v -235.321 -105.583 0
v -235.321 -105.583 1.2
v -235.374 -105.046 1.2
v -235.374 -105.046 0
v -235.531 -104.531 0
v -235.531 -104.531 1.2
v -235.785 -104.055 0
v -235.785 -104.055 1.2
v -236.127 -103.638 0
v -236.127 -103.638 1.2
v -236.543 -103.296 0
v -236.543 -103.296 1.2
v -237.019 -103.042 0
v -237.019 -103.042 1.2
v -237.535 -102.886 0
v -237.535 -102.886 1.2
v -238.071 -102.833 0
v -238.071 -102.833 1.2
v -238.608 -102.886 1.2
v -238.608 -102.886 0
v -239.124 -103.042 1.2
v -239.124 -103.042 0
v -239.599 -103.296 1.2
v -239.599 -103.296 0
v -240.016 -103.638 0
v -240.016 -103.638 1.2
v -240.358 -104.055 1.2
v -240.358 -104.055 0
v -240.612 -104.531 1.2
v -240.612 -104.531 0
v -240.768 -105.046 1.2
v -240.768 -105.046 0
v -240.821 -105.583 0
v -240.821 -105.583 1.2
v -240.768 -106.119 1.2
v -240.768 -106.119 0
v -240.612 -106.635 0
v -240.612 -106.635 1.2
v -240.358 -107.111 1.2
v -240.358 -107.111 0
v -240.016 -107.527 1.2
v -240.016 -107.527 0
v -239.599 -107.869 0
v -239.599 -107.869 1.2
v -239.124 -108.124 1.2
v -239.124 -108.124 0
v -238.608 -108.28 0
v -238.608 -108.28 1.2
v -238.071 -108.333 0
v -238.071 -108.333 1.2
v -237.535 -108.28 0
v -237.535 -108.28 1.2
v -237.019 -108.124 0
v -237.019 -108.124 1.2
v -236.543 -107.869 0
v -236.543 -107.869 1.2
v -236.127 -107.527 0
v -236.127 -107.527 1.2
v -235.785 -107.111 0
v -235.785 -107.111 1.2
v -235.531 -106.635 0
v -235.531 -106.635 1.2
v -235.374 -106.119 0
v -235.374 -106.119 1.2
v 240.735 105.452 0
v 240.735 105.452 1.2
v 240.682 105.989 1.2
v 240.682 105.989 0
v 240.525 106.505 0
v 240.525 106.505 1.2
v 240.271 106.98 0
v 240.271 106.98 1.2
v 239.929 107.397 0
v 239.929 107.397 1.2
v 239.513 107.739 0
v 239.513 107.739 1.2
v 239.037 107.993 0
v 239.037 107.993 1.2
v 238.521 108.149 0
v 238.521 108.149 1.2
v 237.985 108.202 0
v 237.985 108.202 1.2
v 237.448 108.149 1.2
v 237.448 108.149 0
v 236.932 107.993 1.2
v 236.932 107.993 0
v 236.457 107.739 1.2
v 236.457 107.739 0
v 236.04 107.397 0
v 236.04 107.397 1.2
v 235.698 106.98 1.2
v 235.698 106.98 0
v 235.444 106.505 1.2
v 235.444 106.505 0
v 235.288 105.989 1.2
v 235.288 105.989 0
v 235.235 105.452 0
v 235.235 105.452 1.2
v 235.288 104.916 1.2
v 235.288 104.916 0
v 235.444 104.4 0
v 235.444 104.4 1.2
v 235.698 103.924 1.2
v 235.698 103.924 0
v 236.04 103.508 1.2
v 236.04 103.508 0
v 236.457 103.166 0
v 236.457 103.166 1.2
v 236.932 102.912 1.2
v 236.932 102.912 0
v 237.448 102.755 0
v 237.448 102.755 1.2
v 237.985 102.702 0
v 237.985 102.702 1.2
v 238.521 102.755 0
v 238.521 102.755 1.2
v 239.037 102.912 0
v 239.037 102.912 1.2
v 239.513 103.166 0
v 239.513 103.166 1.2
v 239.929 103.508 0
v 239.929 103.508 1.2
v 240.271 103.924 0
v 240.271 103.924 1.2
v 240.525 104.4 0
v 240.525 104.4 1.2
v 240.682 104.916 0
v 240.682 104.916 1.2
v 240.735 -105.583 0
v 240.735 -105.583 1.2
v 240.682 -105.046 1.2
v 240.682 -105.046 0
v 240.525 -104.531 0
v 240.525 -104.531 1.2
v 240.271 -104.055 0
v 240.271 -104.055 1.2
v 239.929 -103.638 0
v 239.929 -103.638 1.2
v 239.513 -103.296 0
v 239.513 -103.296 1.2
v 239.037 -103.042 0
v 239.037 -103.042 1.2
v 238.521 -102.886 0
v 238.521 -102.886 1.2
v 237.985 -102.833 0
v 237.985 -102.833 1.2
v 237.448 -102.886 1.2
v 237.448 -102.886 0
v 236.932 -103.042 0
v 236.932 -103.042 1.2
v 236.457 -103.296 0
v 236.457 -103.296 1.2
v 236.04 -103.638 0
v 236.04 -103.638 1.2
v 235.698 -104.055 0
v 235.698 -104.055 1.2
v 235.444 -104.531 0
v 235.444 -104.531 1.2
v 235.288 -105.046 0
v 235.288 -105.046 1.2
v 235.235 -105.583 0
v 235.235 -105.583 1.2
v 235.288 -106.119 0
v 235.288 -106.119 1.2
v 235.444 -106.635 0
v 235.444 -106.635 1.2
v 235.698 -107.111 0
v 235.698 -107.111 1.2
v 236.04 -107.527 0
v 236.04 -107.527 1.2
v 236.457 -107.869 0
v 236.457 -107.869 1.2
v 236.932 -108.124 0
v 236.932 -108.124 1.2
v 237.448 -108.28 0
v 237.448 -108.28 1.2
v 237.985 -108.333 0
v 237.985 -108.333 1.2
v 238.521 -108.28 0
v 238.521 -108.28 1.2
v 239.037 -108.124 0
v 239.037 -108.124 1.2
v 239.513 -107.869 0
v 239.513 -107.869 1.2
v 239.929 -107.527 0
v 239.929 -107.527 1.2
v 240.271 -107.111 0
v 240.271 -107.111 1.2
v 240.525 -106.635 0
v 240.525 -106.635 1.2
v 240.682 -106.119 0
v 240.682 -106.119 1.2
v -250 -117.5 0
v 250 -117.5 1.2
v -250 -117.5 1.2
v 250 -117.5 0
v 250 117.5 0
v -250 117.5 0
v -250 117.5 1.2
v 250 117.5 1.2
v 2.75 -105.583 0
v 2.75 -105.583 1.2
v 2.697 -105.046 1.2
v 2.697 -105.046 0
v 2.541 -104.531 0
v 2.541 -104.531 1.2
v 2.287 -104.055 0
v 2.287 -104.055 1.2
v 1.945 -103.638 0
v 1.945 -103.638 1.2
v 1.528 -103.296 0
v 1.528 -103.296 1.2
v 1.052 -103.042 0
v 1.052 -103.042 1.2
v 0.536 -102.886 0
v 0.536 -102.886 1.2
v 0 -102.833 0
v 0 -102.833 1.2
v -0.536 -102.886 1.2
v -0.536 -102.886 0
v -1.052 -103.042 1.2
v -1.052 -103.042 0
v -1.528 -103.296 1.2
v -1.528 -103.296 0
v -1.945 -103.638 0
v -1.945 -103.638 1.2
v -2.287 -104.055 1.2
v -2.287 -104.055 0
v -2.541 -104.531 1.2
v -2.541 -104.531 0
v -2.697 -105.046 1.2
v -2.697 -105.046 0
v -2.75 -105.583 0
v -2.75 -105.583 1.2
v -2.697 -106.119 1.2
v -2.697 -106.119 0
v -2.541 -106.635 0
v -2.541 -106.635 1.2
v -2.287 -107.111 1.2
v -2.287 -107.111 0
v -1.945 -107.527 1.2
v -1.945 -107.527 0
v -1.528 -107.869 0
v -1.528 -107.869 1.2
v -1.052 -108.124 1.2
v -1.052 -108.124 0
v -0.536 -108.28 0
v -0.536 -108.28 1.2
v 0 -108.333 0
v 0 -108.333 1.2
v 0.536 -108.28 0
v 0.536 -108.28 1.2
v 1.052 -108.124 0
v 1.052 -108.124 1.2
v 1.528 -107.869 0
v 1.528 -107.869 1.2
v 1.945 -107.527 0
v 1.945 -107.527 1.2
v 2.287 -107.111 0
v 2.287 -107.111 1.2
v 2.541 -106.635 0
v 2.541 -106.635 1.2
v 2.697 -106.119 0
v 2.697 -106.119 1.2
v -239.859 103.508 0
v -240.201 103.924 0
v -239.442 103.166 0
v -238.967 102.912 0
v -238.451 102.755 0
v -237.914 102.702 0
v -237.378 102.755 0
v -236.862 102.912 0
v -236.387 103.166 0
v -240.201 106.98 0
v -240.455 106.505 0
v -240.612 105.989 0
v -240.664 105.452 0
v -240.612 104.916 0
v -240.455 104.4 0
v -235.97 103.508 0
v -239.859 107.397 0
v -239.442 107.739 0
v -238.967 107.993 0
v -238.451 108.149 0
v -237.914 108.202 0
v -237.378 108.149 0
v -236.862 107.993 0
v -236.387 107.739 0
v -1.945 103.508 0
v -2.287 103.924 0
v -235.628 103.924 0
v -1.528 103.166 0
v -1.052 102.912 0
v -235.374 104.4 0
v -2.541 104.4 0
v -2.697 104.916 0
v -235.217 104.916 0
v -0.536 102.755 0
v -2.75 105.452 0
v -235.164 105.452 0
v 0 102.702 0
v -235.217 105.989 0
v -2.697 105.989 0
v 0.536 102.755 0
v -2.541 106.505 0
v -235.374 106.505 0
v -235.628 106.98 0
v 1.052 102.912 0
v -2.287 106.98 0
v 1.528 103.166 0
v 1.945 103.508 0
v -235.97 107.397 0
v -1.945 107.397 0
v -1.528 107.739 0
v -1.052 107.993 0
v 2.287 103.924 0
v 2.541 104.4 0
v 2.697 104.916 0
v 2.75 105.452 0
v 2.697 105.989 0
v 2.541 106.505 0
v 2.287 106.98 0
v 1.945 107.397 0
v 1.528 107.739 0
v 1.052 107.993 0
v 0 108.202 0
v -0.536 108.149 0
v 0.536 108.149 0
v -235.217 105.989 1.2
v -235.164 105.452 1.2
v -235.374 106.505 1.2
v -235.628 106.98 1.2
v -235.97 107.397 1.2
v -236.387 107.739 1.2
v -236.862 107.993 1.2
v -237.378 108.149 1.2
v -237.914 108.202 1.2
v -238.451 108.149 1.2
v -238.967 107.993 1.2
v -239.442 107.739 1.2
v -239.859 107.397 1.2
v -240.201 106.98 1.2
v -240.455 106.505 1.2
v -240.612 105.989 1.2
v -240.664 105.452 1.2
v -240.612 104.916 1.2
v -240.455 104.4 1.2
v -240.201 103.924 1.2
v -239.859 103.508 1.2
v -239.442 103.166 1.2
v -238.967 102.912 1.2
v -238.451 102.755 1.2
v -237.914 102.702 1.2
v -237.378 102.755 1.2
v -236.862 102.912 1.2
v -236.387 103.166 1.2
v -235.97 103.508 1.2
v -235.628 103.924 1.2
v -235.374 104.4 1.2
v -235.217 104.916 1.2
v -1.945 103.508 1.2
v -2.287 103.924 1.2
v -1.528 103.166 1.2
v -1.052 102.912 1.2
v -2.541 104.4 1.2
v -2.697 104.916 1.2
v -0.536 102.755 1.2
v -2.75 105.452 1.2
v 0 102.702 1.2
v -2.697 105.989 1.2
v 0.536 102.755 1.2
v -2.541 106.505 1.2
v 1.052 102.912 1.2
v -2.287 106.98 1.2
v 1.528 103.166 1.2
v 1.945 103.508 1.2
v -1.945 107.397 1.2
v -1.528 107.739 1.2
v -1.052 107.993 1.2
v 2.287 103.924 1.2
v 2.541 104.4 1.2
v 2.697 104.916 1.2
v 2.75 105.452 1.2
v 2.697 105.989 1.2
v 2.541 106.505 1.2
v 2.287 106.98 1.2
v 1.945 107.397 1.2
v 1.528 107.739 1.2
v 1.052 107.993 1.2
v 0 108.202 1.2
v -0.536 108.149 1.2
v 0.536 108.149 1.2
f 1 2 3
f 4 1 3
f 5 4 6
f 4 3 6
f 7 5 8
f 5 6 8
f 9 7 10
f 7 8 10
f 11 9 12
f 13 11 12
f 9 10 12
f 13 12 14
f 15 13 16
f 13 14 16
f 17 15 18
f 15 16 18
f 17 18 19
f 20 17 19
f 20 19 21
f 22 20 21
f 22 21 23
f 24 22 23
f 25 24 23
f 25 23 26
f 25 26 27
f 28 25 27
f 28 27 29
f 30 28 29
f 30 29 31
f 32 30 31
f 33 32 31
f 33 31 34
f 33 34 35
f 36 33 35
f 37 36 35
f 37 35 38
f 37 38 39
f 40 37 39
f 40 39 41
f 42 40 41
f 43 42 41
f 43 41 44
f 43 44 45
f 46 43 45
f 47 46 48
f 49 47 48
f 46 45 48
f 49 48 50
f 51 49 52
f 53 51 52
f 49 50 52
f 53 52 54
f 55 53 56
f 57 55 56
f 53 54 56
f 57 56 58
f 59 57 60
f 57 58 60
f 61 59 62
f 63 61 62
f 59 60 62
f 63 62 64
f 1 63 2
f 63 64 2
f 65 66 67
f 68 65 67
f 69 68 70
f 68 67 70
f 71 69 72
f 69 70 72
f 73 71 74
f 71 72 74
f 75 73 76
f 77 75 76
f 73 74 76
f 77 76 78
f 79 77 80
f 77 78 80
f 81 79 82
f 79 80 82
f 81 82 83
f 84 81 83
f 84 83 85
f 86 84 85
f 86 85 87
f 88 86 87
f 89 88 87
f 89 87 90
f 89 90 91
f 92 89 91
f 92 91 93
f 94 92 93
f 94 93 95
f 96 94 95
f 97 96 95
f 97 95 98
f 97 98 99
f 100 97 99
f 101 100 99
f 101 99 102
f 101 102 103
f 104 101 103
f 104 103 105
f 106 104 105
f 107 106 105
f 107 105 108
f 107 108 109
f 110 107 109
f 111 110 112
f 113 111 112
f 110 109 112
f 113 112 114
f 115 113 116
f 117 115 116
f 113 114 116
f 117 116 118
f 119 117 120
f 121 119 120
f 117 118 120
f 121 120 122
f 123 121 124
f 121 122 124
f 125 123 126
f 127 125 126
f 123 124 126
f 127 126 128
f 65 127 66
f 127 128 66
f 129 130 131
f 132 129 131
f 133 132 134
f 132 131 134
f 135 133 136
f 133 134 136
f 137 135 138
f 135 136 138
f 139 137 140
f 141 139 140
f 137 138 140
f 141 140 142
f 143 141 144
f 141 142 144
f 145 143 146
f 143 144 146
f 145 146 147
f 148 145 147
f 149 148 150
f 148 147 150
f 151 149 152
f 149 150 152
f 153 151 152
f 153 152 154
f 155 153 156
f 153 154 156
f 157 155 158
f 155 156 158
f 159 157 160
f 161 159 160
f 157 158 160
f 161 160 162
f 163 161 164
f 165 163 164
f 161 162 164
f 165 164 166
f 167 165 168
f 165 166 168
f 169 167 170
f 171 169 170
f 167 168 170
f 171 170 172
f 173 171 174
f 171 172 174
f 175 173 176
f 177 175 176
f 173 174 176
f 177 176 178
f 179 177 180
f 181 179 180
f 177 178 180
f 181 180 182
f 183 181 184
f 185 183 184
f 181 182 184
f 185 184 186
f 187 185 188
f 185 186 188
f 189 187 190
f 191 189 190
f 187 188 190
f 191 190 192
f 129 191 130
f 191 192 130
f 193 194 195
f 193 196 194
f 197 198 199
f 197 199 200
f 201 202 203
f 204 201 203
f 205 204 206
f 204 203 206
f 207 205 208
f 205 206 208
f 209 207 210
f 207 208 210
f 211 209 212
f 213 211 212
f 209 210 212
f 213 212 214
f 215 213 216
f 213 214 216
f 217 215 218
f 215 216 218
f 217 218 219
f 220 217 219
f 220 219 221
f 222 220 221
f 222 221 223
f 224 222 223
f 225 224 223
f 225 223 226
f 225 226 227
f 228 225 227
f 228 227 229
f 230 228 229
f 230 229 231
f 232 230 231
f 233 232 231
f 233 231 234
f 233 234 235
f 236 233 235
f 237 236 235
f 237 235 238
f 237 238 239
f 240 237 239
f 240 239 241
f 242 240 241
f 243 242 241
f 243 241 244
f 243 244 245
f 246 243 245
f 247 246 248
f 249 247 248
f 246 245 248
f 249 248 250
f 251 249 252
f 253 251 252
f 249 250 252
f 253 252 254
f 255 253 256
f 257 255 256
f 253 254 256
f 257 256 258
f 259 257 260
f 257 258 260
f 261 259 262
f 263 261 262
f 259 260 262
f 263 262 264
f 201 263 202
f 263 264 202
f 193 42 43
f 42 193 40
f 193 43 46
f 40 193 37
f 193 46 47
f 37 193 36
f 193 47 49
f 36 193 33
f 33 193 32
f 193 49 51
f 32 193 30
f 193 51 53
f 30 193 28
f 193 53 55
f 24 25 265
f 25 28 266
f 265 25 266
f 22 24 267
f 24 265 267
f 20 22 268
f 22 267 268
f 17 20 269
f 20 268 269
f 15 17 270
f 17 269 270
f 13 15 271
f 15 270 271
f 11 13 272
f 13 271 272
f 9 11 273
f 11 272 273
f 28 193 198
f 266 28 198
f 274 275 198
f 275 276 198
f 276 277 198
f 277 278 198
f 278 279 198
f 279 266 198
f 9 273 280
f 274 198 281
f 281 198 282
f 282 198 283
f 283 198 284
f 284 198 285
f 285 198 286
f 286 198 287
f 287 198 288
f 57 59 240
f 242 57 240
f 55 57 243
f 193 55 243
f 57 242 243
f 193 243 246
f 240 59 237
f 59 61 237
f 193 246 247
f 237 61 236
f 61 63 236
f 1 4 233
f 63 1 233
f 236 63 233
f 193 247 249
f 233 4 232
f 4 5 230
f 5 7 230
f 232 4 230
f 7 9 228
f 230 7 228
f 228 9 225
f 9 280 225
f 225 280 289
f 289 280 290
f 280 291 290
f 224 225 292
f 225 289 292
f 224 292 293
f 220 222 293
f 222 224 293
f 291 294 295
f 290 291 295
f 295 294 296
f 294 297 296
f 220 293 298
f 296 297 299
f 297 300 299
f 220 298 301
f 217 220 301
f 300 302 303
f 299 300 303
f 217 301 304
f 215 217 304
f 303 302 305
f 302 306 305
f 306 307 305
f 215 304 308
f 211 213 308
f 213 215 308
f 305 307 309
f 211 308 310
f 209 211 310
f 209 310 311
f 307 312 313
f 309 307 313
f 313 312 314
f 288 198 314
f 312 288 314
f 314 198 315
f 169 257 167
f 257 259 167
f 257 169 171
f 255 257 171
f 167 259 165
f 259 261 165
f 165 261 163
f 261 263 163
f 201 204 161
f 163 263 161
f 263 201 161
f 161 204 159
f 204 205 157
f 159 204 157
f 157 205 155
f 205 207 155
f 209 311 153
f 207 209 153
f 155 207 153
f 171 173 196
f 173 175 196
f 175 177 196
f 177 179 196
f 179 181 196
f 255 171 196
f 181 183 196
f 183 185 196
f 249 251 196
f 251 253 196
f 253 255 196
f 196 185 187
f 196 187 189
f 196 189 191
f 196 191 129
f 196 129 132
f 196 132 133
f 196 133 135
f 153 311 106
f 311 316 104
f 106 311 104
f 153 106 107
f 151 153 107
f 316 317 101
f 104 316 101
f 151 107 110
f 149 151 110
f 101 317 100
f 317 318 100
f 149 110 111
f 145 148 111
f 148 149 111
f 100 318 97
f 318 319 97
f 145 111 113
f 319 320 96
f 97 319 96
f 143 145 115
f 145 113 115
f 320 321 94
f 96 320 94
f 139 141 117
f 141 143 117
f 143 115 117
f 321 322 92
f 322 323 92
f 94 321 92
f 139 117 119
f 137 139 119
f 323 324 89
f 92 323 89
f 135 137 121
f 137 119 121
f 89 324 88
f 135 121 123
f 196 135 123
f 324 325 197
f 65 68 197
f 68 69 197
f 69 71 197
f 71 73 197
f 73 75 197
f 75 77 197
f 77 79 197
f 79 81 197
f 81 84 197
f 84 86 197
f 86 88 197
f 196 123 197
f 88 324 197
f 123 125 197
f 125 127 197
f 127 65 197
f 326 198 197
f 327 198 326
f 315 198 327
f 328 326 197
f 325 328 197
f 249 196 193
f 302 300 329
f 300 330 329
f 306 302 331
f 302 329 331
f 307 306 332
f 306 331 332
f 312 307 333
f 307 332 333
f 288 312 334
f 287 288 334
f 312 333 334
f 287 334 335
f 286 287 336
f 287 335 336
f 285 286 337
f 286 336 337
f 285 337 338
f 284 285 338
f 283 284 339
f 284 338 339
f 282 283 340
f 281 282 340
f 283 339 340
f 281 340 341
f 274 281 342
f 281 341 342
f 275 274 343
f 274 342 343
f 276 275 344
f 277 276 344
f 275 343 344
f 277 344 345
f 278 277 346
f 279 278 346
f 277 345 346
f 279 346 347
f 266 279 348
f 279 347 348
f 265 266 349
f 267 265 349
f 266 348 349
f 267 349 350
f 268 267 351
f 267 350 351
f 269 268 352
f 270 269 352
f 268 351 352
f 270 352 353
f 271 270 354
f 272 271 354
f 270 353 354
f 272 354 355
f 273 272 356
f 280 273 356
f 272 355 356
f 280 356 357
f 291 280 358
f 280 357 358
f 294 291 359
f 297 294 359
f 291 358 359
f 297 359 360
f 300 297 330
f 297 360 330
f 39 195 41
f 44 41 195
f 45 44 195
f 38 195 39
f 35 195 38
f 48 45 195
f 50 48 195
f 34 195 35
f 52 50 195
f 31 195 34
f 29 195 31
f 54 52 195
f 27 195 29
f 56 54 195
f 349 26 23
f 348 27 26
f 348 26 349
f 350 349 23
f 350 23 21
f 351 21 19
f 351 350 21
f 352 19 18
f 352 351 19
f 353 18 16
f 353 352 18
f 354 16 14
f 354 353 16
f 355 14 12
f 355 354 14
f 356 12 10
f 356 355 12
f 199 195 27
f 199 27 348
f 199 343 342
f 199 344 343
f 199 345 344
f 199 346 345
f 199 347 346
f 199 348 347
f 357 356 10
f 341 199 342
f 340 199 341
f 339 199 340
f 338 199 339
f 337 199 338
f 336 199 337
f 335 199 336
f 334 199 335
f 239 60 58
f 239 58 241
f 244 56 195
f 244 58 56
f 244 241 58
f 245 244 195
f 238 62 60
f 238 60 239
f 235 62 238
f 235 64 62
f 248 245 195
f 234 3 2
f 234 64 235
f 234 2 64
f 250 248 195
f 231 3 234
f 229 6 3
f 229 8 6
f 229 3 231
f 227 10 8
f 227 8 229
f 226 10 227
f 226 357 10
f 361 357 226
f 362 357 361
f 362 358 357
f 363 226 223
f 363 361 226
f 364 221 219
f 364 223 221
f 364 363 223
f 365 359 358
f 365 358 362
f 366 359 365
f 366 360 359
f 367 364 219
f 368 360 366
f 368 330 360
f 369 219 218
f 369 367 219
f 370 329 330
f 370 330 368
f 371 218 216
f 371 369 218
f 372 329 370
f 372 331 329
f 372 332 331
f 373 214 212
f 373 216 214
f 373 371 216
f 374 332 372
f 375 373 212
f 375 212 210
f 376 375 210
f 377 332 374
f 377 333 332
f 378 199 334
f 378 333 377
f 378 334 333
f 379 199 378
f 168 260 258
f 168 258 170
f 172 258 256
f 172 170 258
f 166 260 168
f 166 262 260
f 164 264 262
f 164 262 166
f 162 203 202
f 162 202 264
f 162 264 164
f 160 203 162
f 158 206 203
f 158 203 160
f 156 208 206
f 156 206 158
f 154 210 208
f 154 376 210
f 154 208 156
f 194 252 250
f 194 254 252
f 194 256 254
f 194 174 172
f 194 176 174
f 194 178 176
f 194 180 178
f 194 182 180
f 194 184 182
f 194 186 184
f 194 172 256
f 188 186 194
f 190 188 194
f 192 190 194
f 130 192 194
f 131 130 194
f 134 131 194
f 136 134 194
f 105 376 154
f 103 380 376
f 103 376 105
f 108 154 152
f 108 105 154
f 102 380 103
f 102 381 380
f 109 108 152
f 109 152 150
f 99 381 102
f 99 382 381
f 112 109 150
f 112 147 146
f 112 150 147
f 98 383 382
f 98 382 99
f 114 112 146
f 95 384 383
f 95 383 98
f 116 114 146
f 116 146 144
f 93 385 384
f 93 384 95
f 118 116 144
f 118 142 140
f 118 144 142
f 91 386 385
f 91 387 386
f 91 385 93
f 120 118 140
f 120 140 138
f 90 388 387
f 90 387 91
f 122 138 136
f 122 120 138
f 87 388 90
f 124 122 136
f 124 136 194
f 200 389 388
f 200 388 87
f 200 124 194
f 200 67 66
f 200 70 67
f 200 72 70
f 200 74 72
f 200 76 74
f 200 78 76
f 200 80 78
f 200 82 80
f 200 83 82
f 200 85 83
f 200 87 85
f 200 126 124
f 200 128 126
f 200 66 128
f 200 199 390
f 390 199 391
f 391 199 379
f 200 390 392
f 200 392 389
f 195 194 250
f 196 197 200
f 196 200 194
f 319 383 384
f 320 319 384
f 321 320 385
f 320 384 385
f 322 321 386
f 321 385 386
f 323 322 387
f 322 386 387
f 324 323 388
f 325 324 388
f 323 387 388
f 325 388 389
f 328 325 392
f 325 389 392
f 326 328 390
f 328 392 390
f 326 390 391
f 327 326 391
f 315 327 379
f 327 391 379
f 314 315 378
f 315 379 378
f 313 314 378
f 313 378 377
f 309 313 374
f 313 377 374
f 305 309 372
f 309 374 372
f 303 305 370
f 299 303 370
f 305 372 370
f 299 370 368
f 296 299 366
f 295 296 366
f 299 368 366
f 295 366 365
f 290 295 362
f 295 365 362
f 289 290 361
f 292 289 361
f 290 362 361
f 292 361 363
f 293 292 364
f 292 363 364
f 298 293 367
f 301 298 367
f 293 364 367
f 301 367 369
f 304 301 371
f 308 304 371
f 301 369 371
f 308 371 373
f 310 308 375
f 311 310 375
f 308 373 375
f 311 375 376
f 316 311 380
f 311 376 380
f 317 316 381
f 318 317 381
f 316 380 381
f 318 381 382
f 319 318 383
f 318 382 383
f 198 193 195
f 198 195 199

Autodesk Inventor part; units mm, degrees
ref_plane "YZ Plane" through (0, 0, 0) normal (1, 0, 0) x (0, 1, 0)
ref_plane "XZ Plane" through (0, 0, 0) normal (0, 1, 0) x (-1, 0, 0)
ref_plane "XY Plane" through (0, 0, 0) normal (0, 0, 1) x (1, 0, 0)
sketch "스케치1" plane through (0, 0, 0) normal (0, 0, 1) x (1, 0, 0)
  line L0 (250, -117.5) -> (-250, -117.5)
  line L1 (-250, -117.5) -> (-250, 117.5)
  line L2 (-250, 117.5) -> (250, 117.5)
  line L3 (250, 117.5) -> (250, -117.5)
  line L4 (250, -117.5) -> (-250, 117.5) construction
  line L5 (-250, -117.5) -> (250, 117.5) construction
  point P0 (0, 0)
  dimension "d0" = 500
  dimension "d1" = 235
extrude "돌출1" add sketch "스케치1" along normal blind 1.2
sketch "스케치2" plane through (0, 0, 1.2) normal (0, 0, 1) x (1, 0, 0)
  line L0 (-250, -117.5) -> (250, -117.5) projected
  line L1 (250, -117.5) -> (250, 117.5) projected
  line L2 (250, 117.5) -> (-250, 117.5) projected
  line L3 (-250, 117.5) -> (-250, -117.5) projected
  point P0 (0, 0)
sketch "스케치3" plane through (0, 0, 1.2) normal (0, 0, 1) x (1, 0, 0)
  line L0 (-250, -117.5) -> (250, -117.5) projected
  line L1 (250, -117.5) -> (250, 117.5) projected
  line L2 (250, 117.5) -> (-250, 117.5) projected
  line L3 (-250, 117.5) -> (-250, -117.5) projected
  point P0 (0, 0)
sketch "스케치4" plane through (0, 0, 1.2) normal (0, 0, 1) x (1, 0, 0)
  line L0 (-250, -117.5) -> (250, -117.5) projected
  line L1 (250, -117.5) -> (250, 117.5) projected
  line L2 (250, 117.5) -> (-250, 117.5) projected
  line L3 (-250, 117.5) -> (-250, -117.5) projected
  point P0 (0, 0)
sketch "스케치5" plane through (0, 0, 1.2) normal (0, 0, 1) x (1, 0, 0)
  line L0 (-250, -117.5) -> (250, -117.5) projected
  line L1 (250, -117.5) -> (250, 117.5) projected
  line L2 (250, 117.5) -> (-250, 117.5) projected
  line L3 (-250, 117.5) -> (-250, -117.5) projected
  circle A0 centre (-238.0339, 105.4556) radius 2.75
  circle A1 centre (0, 105.4556) radius 2.75
  circle A2 centre (237.9578, 105.4556) radius 2.75
  circle A3 centre (237.9578, -105.56) radius 2.75
  circle A4 centre (0, -105.56) radius 2.75
  circle A5 centre (-238.0339, -105.56) radius 2.75
  point P0 (0, 0)
  dimension "d4" = 5.5
  dimension "d5" = 5.5
  dimension "d6" = 5.5
  dimension "d7" = 5.5
  dimension "d8" = 5.5
  dimension "d9" = 5.5
sketch "스케치6" plane through (0, 0, 1.2) normal (0, 0, 1) x (1, 0, 0)
  circle A0 centre (0, 105.4523) radius 2.75
  circle A1 centre (-237.9144, 105.4523) radius 2.75
  circle A2 centre (-238.0713, -105.5829) radius 2.75
  circle A3 centre (0, -105.5829) radius 2.75
  circle A4 centre (237.9848, -105.5829) radius 2.75
  circle A5 centre (237.9848, 105.4523) radius 2.75
  point P0 (0, 0)
  dimension "d10" = 5.5
  dimension "d11" = 5.5
  dimension "d12" = 5.5
  dimension "d13" = 5.5
  dimension "d14" = 5.5
  dimension "d15" = 5.5
extrude "돌출2" cut sketch "스케치6" against normal blind 10
properties part number "240710_part3"
